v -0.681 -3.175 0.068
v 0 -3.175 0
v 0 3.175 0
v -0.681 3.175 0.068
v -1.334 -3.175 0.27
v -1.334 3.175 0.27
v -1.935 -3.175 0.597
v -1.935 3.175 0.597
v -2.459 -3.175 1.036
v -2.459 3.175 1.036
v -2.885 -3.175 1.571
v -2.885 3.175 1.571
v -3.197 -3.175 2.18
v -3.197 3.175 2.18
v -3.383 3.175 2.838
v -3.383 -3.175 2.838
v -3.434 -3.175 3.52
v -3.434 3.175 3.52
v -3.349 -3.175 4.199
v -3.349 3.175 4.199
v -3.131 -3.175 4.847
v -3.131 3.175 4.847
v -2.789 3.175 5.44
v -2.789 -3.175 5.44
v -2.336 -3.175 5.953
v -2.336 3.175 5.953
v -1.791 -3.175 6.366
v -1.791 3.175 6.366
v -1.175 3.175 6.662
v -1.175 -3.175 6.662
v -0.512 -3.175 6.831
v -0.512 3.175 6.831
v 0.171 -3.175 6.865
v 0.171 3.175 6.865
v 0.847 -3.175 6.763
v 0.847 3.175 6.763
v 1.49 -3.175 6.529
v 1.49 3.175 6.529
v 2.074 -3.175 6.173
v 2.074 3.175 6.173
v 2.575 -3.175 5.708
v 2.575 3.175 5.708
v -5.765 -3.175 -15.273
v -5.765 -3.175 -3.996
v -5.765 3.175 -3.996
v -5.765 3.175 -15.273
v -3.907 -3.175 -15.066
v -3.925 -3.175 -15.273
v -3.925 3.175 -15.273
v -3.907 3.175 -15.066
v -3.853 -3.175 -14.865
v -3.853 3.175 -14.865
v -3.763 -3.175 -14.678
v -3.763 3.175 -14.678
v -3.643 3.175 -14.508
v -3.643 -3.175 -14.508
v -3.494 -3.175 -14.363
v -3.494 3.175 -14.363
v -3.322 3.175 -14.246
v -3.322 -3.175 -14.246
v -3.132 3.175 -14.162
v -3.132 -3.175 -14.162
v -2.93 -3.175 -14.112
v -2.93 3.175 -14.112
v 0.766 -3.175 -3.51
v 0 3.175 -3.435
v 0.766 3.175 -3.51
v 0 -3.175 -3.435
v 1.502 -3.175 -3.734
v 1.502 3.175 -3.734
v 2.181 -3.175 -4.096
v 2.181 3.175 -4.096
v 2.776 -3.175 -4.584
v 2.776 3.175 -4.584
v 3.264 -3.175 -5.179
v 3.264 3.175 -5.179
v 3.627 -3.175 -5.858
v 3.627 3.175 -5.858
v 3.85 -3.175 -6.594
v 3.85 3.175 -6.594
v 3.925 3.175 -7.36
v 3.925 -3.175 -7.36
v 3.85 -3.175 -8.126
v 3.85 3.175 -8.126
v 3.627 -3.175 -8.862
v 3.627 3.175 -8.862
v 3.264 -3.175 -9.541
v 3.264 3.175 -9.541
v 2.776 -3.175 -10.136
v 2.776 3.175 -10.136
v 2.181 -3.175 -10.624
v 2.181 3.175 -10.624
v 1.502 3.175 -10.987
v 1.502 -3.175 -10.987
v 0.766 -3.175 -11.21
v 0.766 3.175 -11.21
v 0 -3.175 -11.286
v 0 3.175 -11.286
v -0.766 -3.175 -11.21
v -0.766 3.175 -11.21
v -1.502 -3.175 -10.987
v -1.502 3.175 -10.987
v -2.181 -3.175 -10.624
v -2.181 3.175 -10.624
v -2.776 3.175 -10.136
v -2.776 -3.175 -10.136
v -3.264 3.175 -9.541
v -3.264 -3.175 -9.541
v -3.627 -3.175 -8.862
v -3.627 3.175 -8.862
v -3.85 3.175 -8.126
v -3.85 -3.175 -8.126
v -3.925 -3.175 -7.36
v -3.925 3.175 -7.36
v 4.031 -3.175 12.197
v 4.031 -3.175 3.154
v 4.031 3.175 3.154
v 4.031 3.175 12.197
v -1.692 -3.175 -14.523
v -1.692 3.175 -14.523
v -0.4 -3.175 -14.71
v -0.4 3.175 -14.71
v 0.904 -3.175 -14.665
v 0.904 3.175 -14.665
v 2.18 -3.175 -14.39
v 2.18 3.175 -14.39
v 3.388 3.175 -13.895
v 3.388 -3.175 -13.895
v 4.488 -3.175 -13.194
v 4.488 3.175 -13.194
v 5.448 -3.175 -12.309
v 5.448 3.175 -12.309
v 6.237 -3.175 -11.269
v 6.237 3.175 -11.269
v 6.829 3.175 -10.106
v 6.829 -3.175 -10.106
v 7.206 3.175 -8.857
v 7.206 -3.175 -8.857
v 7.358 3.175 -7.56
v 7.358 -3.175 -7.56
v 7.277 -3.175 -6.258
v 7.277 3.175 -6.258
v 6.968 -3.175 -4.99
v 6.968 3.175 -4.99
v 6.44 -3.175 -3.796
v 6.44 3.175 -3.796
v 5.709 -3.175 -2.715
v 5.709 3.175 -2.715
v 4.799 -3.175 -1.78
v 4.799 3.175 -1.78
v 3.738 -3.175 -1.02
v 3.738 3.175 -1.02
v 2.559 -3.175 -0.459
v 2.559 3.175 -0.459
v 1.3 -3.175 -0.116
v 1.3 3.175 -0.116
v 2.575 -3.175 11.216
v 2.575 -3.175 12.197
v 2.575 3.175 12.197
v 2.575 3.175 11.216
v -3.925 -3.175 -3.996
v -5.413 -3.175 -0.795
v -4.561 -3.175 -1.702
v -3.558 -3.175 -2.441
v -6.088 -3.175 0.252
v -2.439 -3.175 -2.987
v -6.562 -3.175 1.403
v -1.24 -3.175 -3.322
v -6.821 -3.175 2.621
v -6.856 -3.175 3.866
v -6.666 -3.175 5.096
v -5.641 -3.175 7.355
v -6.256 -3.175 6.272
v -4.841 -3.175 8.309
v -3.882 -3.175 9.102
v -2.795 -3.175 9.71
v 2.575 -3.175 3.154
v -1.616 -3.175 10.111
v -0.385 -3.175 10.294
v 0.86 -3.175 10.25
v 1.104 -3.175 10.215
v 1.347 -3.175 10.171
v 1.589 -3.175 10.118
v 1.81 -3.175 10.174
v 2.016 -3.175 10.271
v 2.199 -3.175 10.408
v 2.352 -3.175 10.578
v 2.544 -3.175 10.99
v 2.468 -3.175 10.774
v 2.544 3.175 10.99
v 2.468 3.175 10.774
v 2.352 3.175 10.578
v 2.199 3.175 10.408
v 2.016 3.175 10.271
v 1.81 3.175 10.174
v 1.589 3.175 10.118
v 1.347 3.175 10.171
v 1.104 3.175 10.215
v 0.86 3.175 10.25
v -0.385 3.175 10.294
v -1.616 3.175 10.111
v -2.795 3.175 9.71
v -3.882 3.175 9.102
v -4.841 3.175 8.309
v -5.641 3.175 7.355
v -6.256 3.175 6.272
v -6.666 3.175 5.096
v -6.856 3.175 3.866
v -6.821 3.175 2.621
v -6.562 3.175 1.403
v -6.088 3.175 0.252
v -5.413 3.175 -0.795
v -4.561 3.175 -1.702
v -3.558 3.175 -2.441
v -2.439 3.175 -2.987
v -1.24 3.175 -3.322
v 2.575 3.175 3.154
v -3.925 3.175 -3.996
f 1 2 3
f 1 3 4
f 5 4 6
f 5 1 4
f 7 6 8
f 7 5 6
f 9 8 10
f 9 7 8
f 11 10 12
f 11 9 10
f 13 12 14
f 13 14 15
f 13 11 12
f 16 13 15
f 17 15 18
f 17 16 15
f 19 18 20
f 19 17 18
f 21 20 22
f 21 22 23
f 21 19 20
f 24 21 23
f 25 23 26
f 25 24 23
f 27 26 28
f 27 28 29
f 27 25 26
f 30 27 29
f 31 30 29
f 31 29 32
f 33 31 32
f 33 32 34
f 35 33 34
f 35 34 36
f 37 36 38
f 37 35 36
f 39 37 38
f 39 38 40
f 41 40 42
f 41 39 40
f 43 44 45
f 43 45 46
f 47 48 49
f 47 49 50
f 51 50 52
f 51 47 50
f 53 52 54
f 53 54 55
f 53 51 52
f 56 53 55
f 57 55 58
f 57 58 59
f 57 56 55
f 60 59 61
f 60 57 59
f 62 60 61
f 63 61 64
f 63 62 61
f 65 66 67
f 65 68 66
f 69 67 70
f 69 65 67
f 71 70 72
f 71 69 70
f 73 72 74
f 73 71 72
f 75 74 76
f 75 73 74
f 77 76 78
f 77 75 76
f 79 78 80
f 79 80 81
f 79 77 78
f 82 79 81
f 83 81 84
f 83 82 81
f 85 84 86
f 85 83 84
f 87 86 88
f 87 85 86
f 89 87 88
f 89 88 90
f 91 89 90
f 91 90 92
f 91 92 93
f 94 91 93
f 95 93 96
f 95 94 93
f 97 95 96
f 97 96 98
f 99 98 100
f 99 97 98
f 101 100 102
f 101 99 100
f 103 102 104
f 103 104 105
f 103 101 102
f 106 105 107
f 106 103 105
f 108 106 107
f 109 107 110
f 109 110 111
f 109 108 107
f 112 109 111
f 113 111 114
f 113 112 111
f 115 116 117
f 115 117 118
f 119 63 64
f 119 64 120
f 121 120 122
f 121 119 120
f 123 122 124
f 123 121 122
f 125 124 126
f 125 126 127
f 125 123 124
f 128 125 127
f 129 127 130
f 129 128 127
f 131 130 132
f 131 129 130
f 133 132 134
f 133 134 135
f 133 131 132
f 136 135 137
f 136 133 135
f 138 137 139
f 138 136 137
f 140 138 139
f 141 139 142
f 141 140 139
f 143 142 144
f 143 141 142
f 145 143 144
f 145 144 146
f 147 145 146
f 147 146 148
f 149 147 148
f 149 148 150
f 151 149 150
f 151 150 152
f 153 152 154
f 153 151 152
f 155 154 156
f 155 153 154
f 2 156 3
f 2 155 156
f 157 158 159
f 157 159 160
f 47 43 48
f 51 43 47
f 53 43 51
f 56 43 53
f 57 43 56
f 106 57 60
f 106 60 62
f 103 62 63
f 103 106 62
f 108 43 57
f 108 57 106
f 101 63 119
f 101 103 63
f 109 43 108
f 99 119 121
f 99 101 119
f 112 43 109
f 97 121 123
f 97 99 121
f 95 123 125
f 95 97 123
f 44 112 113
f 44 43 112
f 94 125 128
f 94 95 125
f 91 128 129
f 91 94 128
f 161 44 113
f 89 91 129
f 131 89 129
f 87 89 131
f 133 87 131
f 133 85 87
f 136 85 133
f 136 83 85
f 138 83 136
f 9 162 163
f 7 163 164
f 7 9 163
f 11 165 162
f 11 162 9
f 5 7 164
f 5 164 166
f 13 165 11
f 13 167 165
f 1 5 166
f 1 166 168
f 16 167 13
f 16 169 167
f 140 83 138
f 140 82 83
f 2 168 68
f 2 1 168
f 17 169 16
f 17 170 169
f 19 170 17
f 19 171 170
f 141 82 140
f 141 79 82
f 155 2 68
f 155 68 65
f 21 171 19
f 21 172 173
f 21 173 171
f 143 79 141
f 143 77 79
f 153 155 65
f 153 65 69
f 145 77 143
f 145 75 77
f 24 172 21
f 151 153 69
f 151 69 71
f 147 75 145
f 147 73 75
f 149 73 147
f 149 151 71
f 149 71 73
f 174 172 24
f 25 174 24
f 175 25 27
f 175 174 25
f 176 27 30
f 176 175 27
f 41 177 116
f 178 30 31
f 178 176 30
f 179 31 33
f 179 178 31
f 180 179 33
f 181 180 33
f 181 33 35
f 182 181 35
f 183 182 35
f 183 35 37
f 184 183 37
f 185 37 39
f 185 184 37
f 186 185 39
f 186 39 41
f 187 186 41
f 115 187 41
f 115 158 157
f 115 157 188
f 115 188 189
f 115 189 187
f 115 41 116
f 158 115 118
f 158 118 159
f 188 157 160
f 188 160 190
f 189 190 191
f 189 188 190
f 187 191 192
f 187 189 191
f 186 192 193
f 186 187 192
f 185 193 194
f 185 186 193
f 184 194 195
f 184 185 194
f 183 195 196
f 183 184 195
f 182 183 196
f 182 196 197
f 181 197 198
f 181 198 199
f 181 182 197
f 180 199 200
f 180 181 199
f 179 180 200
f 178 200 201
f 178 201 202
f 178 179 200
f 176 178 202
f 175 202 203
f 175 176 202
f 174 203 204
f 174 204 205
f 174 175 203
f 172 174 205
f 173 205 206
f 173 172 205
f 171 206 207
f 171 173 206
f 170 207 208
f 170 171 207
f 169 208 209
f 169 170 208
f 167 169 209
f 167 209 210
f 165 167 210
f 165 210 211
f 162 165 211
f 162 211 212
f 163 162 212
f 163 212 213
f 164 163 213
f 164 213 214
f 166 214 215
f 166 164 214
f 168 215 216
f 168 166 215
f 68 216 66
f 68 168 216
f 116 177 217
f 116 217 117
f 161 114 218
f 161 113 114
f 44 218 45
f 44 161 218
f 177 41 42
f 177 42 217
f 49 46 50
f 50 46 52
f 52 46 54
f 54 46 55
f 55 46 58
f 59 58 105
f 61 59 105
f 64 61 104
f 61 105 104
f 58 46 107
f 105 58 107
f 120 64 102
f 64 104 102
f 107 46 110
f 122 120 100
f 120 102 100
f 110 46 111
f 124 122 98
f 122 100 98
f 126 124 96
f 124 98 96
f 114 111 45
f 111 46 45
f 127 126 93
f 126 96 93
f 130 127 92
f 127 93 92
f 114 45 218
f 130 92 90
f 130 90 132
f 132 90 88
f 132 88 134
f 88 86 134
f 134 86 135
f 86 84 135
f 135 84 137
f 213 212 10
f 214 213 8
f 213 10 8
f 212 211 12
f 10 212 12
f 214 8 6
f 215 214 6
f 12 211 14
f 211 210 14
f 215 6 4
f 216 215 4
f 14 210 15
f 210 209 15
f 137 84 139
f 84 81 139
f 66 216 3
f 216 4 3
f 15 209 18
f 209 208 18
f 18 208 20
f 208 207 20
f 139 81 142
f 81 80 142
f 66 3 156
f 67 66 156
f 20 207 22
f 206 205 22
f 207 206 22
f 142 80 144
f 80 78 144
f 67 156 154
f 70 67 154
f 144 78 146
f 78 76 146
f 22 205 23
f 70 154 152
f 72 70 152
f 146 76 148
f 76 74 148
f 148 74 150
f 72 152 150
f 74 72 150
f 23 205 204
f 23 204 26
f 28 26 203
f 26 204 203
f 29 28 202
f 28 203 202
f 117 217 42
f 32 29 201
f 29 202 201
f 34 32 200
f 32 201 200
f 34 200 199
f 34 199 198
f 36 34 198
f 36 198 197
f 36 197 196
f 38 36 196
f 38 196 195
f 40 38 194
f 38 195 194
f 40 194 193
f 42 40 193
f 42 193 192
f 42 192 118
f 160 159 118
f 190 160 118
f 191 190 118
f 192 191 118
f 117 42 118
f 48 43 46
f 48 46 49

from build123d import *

# Parameters (mm, degrees)
F1_DEPTH = 6.35
F2_SCALE = 0.5


with BuildPart() as f1:
    # F0 (on Front) → F1 (new body, symmetric)
    with BuildSketch(Plane.XZ):
        with BuildLine():
            ThreePointArc((-11.5290090528, -23.8732525036), (-9.8294039198, -25.6783091317), (-7.850968465, -27.1725247086))
            Line((-7.850968465, -27.1725247086), (-7.850968465, -14.7204540884))
            Line((-7.850968465, -14.7204540884), (-7.850968465, -7.9911025987))
            Line((-7.850968465, -7.9911025987), (-11.5290090528, -7.9911025987))
            Line((-11.5290090528, -7.9911025987), (-11.5290090528, -23.8732525036))
        make_face()
        with BuildLine():
            Line((-7.850968465, -30.5458810074), (-7.850968465, -27.1725247086))
            ThreePointArc((-7.850968465, -27.1725247086), (-9.8294039198, -25.6783091317), (-11.5290090528, -23.8732525036))
            Line((-11.5290090528, -23.8732525036), (-11.5290090528, -30.5458810074))
            Line((-11.5290090528, -30.5458810074), (-7.850968465, -30.5458810074))
        make_face()
        Polygon((5.1503910808, 19.6066750714), (5.1503910808, 11.4153277746), (5.1503910808, 6.3087673495), (8.0611995911, 6.3087673495), (8.0611995911, 24.3938967455), (5.1503910808, 24.3938967455), (5.1503910808, 22.4311687176), align=None)
        with BuildLine():
            ThreePointArc((-5.8608669981, -28.2238613102), (14.4129812082, -17.7134026782), (0, 0))
            ThreePointArc((0, 0), (-6.2617137528, 9.6947188107), (5.1503910808, 11.4153277746))
            Line((5.1503910808, 11.4153277746), (5.1503910808, 19.6066750714))
            ThreePointArc((5.1503910808, 19.6066750714), (4.1758661078, 19.9585920865), (3.1775916397, 20.236067482))
            ThreePointArc((3.1775916397, 20.236067482), (2.4268766545, 20.2483751203), (1.7196691769, 20.5005299348))
            ThreePointArc((1.7196691769, 20.5005299348), (-13.7119930511, 7.7310759956), (0, -6.8694856234))
            ThreePointArc((0, -6.8694856234), (5.5514730405, -20.2719271289), (-7.850968465, -14.7204540884))
            Line((-7.850968465, -14.7204540884), (-7.850968465, -27.1725247086))
            ThreePointArc((-7.850968465, -27.1725247086), (-6.8760406561, -27.7362841988), (-5.8608669981, -28.2238613102))
        make_face()
        with BuildLine():
            ThreePointArc((1.7196691769, 20.5005299348), (2.4268766545, 20.2483751203), (3.1775916397, 20.236067482))
            ThreePointArc((3.1775916397, 20.236067482), (2.4521981922, 20.3879671044), (1.7196691769, 20.5005299348))
        make_face()
        with BuildLine():
            ThreePointArc((3.1775916397, 20.236067482), (4.1758661078, 19.9585920865), (5.1503910808, 19.6066750714))
            Line((5.1503910808, 19.6066750714), (5.1503910808, 22.4311687176))
            ThreePointArc((5.1503910808, 22.4311687176), (4.5596761112, 20.9780050452), (3.1775916397, 20.236067482))
        make_face()
        with BuildLine():
            ThreePointArc((-7.850968465, -30.5458810074), (-7.2853702731, -29.0168061791), (-5.8608669981, -28.2238613102))
            ThreePointArc((-5.8608669981, -28.2238613102), (-6.8760406561, -27.7362841988), (-7.850968465, -27.1725247086))
            Line((-7.850968465, -27.1725247086), (-7.850968465, -30.5458810074))
        make_face()
    extrude(amount=F1_DEPTH, both=True)


with BuildPart() as f1_1:
    # F2: moved
    add(f1.part.scale(F2_SCALE))


solid = f1_1.part
